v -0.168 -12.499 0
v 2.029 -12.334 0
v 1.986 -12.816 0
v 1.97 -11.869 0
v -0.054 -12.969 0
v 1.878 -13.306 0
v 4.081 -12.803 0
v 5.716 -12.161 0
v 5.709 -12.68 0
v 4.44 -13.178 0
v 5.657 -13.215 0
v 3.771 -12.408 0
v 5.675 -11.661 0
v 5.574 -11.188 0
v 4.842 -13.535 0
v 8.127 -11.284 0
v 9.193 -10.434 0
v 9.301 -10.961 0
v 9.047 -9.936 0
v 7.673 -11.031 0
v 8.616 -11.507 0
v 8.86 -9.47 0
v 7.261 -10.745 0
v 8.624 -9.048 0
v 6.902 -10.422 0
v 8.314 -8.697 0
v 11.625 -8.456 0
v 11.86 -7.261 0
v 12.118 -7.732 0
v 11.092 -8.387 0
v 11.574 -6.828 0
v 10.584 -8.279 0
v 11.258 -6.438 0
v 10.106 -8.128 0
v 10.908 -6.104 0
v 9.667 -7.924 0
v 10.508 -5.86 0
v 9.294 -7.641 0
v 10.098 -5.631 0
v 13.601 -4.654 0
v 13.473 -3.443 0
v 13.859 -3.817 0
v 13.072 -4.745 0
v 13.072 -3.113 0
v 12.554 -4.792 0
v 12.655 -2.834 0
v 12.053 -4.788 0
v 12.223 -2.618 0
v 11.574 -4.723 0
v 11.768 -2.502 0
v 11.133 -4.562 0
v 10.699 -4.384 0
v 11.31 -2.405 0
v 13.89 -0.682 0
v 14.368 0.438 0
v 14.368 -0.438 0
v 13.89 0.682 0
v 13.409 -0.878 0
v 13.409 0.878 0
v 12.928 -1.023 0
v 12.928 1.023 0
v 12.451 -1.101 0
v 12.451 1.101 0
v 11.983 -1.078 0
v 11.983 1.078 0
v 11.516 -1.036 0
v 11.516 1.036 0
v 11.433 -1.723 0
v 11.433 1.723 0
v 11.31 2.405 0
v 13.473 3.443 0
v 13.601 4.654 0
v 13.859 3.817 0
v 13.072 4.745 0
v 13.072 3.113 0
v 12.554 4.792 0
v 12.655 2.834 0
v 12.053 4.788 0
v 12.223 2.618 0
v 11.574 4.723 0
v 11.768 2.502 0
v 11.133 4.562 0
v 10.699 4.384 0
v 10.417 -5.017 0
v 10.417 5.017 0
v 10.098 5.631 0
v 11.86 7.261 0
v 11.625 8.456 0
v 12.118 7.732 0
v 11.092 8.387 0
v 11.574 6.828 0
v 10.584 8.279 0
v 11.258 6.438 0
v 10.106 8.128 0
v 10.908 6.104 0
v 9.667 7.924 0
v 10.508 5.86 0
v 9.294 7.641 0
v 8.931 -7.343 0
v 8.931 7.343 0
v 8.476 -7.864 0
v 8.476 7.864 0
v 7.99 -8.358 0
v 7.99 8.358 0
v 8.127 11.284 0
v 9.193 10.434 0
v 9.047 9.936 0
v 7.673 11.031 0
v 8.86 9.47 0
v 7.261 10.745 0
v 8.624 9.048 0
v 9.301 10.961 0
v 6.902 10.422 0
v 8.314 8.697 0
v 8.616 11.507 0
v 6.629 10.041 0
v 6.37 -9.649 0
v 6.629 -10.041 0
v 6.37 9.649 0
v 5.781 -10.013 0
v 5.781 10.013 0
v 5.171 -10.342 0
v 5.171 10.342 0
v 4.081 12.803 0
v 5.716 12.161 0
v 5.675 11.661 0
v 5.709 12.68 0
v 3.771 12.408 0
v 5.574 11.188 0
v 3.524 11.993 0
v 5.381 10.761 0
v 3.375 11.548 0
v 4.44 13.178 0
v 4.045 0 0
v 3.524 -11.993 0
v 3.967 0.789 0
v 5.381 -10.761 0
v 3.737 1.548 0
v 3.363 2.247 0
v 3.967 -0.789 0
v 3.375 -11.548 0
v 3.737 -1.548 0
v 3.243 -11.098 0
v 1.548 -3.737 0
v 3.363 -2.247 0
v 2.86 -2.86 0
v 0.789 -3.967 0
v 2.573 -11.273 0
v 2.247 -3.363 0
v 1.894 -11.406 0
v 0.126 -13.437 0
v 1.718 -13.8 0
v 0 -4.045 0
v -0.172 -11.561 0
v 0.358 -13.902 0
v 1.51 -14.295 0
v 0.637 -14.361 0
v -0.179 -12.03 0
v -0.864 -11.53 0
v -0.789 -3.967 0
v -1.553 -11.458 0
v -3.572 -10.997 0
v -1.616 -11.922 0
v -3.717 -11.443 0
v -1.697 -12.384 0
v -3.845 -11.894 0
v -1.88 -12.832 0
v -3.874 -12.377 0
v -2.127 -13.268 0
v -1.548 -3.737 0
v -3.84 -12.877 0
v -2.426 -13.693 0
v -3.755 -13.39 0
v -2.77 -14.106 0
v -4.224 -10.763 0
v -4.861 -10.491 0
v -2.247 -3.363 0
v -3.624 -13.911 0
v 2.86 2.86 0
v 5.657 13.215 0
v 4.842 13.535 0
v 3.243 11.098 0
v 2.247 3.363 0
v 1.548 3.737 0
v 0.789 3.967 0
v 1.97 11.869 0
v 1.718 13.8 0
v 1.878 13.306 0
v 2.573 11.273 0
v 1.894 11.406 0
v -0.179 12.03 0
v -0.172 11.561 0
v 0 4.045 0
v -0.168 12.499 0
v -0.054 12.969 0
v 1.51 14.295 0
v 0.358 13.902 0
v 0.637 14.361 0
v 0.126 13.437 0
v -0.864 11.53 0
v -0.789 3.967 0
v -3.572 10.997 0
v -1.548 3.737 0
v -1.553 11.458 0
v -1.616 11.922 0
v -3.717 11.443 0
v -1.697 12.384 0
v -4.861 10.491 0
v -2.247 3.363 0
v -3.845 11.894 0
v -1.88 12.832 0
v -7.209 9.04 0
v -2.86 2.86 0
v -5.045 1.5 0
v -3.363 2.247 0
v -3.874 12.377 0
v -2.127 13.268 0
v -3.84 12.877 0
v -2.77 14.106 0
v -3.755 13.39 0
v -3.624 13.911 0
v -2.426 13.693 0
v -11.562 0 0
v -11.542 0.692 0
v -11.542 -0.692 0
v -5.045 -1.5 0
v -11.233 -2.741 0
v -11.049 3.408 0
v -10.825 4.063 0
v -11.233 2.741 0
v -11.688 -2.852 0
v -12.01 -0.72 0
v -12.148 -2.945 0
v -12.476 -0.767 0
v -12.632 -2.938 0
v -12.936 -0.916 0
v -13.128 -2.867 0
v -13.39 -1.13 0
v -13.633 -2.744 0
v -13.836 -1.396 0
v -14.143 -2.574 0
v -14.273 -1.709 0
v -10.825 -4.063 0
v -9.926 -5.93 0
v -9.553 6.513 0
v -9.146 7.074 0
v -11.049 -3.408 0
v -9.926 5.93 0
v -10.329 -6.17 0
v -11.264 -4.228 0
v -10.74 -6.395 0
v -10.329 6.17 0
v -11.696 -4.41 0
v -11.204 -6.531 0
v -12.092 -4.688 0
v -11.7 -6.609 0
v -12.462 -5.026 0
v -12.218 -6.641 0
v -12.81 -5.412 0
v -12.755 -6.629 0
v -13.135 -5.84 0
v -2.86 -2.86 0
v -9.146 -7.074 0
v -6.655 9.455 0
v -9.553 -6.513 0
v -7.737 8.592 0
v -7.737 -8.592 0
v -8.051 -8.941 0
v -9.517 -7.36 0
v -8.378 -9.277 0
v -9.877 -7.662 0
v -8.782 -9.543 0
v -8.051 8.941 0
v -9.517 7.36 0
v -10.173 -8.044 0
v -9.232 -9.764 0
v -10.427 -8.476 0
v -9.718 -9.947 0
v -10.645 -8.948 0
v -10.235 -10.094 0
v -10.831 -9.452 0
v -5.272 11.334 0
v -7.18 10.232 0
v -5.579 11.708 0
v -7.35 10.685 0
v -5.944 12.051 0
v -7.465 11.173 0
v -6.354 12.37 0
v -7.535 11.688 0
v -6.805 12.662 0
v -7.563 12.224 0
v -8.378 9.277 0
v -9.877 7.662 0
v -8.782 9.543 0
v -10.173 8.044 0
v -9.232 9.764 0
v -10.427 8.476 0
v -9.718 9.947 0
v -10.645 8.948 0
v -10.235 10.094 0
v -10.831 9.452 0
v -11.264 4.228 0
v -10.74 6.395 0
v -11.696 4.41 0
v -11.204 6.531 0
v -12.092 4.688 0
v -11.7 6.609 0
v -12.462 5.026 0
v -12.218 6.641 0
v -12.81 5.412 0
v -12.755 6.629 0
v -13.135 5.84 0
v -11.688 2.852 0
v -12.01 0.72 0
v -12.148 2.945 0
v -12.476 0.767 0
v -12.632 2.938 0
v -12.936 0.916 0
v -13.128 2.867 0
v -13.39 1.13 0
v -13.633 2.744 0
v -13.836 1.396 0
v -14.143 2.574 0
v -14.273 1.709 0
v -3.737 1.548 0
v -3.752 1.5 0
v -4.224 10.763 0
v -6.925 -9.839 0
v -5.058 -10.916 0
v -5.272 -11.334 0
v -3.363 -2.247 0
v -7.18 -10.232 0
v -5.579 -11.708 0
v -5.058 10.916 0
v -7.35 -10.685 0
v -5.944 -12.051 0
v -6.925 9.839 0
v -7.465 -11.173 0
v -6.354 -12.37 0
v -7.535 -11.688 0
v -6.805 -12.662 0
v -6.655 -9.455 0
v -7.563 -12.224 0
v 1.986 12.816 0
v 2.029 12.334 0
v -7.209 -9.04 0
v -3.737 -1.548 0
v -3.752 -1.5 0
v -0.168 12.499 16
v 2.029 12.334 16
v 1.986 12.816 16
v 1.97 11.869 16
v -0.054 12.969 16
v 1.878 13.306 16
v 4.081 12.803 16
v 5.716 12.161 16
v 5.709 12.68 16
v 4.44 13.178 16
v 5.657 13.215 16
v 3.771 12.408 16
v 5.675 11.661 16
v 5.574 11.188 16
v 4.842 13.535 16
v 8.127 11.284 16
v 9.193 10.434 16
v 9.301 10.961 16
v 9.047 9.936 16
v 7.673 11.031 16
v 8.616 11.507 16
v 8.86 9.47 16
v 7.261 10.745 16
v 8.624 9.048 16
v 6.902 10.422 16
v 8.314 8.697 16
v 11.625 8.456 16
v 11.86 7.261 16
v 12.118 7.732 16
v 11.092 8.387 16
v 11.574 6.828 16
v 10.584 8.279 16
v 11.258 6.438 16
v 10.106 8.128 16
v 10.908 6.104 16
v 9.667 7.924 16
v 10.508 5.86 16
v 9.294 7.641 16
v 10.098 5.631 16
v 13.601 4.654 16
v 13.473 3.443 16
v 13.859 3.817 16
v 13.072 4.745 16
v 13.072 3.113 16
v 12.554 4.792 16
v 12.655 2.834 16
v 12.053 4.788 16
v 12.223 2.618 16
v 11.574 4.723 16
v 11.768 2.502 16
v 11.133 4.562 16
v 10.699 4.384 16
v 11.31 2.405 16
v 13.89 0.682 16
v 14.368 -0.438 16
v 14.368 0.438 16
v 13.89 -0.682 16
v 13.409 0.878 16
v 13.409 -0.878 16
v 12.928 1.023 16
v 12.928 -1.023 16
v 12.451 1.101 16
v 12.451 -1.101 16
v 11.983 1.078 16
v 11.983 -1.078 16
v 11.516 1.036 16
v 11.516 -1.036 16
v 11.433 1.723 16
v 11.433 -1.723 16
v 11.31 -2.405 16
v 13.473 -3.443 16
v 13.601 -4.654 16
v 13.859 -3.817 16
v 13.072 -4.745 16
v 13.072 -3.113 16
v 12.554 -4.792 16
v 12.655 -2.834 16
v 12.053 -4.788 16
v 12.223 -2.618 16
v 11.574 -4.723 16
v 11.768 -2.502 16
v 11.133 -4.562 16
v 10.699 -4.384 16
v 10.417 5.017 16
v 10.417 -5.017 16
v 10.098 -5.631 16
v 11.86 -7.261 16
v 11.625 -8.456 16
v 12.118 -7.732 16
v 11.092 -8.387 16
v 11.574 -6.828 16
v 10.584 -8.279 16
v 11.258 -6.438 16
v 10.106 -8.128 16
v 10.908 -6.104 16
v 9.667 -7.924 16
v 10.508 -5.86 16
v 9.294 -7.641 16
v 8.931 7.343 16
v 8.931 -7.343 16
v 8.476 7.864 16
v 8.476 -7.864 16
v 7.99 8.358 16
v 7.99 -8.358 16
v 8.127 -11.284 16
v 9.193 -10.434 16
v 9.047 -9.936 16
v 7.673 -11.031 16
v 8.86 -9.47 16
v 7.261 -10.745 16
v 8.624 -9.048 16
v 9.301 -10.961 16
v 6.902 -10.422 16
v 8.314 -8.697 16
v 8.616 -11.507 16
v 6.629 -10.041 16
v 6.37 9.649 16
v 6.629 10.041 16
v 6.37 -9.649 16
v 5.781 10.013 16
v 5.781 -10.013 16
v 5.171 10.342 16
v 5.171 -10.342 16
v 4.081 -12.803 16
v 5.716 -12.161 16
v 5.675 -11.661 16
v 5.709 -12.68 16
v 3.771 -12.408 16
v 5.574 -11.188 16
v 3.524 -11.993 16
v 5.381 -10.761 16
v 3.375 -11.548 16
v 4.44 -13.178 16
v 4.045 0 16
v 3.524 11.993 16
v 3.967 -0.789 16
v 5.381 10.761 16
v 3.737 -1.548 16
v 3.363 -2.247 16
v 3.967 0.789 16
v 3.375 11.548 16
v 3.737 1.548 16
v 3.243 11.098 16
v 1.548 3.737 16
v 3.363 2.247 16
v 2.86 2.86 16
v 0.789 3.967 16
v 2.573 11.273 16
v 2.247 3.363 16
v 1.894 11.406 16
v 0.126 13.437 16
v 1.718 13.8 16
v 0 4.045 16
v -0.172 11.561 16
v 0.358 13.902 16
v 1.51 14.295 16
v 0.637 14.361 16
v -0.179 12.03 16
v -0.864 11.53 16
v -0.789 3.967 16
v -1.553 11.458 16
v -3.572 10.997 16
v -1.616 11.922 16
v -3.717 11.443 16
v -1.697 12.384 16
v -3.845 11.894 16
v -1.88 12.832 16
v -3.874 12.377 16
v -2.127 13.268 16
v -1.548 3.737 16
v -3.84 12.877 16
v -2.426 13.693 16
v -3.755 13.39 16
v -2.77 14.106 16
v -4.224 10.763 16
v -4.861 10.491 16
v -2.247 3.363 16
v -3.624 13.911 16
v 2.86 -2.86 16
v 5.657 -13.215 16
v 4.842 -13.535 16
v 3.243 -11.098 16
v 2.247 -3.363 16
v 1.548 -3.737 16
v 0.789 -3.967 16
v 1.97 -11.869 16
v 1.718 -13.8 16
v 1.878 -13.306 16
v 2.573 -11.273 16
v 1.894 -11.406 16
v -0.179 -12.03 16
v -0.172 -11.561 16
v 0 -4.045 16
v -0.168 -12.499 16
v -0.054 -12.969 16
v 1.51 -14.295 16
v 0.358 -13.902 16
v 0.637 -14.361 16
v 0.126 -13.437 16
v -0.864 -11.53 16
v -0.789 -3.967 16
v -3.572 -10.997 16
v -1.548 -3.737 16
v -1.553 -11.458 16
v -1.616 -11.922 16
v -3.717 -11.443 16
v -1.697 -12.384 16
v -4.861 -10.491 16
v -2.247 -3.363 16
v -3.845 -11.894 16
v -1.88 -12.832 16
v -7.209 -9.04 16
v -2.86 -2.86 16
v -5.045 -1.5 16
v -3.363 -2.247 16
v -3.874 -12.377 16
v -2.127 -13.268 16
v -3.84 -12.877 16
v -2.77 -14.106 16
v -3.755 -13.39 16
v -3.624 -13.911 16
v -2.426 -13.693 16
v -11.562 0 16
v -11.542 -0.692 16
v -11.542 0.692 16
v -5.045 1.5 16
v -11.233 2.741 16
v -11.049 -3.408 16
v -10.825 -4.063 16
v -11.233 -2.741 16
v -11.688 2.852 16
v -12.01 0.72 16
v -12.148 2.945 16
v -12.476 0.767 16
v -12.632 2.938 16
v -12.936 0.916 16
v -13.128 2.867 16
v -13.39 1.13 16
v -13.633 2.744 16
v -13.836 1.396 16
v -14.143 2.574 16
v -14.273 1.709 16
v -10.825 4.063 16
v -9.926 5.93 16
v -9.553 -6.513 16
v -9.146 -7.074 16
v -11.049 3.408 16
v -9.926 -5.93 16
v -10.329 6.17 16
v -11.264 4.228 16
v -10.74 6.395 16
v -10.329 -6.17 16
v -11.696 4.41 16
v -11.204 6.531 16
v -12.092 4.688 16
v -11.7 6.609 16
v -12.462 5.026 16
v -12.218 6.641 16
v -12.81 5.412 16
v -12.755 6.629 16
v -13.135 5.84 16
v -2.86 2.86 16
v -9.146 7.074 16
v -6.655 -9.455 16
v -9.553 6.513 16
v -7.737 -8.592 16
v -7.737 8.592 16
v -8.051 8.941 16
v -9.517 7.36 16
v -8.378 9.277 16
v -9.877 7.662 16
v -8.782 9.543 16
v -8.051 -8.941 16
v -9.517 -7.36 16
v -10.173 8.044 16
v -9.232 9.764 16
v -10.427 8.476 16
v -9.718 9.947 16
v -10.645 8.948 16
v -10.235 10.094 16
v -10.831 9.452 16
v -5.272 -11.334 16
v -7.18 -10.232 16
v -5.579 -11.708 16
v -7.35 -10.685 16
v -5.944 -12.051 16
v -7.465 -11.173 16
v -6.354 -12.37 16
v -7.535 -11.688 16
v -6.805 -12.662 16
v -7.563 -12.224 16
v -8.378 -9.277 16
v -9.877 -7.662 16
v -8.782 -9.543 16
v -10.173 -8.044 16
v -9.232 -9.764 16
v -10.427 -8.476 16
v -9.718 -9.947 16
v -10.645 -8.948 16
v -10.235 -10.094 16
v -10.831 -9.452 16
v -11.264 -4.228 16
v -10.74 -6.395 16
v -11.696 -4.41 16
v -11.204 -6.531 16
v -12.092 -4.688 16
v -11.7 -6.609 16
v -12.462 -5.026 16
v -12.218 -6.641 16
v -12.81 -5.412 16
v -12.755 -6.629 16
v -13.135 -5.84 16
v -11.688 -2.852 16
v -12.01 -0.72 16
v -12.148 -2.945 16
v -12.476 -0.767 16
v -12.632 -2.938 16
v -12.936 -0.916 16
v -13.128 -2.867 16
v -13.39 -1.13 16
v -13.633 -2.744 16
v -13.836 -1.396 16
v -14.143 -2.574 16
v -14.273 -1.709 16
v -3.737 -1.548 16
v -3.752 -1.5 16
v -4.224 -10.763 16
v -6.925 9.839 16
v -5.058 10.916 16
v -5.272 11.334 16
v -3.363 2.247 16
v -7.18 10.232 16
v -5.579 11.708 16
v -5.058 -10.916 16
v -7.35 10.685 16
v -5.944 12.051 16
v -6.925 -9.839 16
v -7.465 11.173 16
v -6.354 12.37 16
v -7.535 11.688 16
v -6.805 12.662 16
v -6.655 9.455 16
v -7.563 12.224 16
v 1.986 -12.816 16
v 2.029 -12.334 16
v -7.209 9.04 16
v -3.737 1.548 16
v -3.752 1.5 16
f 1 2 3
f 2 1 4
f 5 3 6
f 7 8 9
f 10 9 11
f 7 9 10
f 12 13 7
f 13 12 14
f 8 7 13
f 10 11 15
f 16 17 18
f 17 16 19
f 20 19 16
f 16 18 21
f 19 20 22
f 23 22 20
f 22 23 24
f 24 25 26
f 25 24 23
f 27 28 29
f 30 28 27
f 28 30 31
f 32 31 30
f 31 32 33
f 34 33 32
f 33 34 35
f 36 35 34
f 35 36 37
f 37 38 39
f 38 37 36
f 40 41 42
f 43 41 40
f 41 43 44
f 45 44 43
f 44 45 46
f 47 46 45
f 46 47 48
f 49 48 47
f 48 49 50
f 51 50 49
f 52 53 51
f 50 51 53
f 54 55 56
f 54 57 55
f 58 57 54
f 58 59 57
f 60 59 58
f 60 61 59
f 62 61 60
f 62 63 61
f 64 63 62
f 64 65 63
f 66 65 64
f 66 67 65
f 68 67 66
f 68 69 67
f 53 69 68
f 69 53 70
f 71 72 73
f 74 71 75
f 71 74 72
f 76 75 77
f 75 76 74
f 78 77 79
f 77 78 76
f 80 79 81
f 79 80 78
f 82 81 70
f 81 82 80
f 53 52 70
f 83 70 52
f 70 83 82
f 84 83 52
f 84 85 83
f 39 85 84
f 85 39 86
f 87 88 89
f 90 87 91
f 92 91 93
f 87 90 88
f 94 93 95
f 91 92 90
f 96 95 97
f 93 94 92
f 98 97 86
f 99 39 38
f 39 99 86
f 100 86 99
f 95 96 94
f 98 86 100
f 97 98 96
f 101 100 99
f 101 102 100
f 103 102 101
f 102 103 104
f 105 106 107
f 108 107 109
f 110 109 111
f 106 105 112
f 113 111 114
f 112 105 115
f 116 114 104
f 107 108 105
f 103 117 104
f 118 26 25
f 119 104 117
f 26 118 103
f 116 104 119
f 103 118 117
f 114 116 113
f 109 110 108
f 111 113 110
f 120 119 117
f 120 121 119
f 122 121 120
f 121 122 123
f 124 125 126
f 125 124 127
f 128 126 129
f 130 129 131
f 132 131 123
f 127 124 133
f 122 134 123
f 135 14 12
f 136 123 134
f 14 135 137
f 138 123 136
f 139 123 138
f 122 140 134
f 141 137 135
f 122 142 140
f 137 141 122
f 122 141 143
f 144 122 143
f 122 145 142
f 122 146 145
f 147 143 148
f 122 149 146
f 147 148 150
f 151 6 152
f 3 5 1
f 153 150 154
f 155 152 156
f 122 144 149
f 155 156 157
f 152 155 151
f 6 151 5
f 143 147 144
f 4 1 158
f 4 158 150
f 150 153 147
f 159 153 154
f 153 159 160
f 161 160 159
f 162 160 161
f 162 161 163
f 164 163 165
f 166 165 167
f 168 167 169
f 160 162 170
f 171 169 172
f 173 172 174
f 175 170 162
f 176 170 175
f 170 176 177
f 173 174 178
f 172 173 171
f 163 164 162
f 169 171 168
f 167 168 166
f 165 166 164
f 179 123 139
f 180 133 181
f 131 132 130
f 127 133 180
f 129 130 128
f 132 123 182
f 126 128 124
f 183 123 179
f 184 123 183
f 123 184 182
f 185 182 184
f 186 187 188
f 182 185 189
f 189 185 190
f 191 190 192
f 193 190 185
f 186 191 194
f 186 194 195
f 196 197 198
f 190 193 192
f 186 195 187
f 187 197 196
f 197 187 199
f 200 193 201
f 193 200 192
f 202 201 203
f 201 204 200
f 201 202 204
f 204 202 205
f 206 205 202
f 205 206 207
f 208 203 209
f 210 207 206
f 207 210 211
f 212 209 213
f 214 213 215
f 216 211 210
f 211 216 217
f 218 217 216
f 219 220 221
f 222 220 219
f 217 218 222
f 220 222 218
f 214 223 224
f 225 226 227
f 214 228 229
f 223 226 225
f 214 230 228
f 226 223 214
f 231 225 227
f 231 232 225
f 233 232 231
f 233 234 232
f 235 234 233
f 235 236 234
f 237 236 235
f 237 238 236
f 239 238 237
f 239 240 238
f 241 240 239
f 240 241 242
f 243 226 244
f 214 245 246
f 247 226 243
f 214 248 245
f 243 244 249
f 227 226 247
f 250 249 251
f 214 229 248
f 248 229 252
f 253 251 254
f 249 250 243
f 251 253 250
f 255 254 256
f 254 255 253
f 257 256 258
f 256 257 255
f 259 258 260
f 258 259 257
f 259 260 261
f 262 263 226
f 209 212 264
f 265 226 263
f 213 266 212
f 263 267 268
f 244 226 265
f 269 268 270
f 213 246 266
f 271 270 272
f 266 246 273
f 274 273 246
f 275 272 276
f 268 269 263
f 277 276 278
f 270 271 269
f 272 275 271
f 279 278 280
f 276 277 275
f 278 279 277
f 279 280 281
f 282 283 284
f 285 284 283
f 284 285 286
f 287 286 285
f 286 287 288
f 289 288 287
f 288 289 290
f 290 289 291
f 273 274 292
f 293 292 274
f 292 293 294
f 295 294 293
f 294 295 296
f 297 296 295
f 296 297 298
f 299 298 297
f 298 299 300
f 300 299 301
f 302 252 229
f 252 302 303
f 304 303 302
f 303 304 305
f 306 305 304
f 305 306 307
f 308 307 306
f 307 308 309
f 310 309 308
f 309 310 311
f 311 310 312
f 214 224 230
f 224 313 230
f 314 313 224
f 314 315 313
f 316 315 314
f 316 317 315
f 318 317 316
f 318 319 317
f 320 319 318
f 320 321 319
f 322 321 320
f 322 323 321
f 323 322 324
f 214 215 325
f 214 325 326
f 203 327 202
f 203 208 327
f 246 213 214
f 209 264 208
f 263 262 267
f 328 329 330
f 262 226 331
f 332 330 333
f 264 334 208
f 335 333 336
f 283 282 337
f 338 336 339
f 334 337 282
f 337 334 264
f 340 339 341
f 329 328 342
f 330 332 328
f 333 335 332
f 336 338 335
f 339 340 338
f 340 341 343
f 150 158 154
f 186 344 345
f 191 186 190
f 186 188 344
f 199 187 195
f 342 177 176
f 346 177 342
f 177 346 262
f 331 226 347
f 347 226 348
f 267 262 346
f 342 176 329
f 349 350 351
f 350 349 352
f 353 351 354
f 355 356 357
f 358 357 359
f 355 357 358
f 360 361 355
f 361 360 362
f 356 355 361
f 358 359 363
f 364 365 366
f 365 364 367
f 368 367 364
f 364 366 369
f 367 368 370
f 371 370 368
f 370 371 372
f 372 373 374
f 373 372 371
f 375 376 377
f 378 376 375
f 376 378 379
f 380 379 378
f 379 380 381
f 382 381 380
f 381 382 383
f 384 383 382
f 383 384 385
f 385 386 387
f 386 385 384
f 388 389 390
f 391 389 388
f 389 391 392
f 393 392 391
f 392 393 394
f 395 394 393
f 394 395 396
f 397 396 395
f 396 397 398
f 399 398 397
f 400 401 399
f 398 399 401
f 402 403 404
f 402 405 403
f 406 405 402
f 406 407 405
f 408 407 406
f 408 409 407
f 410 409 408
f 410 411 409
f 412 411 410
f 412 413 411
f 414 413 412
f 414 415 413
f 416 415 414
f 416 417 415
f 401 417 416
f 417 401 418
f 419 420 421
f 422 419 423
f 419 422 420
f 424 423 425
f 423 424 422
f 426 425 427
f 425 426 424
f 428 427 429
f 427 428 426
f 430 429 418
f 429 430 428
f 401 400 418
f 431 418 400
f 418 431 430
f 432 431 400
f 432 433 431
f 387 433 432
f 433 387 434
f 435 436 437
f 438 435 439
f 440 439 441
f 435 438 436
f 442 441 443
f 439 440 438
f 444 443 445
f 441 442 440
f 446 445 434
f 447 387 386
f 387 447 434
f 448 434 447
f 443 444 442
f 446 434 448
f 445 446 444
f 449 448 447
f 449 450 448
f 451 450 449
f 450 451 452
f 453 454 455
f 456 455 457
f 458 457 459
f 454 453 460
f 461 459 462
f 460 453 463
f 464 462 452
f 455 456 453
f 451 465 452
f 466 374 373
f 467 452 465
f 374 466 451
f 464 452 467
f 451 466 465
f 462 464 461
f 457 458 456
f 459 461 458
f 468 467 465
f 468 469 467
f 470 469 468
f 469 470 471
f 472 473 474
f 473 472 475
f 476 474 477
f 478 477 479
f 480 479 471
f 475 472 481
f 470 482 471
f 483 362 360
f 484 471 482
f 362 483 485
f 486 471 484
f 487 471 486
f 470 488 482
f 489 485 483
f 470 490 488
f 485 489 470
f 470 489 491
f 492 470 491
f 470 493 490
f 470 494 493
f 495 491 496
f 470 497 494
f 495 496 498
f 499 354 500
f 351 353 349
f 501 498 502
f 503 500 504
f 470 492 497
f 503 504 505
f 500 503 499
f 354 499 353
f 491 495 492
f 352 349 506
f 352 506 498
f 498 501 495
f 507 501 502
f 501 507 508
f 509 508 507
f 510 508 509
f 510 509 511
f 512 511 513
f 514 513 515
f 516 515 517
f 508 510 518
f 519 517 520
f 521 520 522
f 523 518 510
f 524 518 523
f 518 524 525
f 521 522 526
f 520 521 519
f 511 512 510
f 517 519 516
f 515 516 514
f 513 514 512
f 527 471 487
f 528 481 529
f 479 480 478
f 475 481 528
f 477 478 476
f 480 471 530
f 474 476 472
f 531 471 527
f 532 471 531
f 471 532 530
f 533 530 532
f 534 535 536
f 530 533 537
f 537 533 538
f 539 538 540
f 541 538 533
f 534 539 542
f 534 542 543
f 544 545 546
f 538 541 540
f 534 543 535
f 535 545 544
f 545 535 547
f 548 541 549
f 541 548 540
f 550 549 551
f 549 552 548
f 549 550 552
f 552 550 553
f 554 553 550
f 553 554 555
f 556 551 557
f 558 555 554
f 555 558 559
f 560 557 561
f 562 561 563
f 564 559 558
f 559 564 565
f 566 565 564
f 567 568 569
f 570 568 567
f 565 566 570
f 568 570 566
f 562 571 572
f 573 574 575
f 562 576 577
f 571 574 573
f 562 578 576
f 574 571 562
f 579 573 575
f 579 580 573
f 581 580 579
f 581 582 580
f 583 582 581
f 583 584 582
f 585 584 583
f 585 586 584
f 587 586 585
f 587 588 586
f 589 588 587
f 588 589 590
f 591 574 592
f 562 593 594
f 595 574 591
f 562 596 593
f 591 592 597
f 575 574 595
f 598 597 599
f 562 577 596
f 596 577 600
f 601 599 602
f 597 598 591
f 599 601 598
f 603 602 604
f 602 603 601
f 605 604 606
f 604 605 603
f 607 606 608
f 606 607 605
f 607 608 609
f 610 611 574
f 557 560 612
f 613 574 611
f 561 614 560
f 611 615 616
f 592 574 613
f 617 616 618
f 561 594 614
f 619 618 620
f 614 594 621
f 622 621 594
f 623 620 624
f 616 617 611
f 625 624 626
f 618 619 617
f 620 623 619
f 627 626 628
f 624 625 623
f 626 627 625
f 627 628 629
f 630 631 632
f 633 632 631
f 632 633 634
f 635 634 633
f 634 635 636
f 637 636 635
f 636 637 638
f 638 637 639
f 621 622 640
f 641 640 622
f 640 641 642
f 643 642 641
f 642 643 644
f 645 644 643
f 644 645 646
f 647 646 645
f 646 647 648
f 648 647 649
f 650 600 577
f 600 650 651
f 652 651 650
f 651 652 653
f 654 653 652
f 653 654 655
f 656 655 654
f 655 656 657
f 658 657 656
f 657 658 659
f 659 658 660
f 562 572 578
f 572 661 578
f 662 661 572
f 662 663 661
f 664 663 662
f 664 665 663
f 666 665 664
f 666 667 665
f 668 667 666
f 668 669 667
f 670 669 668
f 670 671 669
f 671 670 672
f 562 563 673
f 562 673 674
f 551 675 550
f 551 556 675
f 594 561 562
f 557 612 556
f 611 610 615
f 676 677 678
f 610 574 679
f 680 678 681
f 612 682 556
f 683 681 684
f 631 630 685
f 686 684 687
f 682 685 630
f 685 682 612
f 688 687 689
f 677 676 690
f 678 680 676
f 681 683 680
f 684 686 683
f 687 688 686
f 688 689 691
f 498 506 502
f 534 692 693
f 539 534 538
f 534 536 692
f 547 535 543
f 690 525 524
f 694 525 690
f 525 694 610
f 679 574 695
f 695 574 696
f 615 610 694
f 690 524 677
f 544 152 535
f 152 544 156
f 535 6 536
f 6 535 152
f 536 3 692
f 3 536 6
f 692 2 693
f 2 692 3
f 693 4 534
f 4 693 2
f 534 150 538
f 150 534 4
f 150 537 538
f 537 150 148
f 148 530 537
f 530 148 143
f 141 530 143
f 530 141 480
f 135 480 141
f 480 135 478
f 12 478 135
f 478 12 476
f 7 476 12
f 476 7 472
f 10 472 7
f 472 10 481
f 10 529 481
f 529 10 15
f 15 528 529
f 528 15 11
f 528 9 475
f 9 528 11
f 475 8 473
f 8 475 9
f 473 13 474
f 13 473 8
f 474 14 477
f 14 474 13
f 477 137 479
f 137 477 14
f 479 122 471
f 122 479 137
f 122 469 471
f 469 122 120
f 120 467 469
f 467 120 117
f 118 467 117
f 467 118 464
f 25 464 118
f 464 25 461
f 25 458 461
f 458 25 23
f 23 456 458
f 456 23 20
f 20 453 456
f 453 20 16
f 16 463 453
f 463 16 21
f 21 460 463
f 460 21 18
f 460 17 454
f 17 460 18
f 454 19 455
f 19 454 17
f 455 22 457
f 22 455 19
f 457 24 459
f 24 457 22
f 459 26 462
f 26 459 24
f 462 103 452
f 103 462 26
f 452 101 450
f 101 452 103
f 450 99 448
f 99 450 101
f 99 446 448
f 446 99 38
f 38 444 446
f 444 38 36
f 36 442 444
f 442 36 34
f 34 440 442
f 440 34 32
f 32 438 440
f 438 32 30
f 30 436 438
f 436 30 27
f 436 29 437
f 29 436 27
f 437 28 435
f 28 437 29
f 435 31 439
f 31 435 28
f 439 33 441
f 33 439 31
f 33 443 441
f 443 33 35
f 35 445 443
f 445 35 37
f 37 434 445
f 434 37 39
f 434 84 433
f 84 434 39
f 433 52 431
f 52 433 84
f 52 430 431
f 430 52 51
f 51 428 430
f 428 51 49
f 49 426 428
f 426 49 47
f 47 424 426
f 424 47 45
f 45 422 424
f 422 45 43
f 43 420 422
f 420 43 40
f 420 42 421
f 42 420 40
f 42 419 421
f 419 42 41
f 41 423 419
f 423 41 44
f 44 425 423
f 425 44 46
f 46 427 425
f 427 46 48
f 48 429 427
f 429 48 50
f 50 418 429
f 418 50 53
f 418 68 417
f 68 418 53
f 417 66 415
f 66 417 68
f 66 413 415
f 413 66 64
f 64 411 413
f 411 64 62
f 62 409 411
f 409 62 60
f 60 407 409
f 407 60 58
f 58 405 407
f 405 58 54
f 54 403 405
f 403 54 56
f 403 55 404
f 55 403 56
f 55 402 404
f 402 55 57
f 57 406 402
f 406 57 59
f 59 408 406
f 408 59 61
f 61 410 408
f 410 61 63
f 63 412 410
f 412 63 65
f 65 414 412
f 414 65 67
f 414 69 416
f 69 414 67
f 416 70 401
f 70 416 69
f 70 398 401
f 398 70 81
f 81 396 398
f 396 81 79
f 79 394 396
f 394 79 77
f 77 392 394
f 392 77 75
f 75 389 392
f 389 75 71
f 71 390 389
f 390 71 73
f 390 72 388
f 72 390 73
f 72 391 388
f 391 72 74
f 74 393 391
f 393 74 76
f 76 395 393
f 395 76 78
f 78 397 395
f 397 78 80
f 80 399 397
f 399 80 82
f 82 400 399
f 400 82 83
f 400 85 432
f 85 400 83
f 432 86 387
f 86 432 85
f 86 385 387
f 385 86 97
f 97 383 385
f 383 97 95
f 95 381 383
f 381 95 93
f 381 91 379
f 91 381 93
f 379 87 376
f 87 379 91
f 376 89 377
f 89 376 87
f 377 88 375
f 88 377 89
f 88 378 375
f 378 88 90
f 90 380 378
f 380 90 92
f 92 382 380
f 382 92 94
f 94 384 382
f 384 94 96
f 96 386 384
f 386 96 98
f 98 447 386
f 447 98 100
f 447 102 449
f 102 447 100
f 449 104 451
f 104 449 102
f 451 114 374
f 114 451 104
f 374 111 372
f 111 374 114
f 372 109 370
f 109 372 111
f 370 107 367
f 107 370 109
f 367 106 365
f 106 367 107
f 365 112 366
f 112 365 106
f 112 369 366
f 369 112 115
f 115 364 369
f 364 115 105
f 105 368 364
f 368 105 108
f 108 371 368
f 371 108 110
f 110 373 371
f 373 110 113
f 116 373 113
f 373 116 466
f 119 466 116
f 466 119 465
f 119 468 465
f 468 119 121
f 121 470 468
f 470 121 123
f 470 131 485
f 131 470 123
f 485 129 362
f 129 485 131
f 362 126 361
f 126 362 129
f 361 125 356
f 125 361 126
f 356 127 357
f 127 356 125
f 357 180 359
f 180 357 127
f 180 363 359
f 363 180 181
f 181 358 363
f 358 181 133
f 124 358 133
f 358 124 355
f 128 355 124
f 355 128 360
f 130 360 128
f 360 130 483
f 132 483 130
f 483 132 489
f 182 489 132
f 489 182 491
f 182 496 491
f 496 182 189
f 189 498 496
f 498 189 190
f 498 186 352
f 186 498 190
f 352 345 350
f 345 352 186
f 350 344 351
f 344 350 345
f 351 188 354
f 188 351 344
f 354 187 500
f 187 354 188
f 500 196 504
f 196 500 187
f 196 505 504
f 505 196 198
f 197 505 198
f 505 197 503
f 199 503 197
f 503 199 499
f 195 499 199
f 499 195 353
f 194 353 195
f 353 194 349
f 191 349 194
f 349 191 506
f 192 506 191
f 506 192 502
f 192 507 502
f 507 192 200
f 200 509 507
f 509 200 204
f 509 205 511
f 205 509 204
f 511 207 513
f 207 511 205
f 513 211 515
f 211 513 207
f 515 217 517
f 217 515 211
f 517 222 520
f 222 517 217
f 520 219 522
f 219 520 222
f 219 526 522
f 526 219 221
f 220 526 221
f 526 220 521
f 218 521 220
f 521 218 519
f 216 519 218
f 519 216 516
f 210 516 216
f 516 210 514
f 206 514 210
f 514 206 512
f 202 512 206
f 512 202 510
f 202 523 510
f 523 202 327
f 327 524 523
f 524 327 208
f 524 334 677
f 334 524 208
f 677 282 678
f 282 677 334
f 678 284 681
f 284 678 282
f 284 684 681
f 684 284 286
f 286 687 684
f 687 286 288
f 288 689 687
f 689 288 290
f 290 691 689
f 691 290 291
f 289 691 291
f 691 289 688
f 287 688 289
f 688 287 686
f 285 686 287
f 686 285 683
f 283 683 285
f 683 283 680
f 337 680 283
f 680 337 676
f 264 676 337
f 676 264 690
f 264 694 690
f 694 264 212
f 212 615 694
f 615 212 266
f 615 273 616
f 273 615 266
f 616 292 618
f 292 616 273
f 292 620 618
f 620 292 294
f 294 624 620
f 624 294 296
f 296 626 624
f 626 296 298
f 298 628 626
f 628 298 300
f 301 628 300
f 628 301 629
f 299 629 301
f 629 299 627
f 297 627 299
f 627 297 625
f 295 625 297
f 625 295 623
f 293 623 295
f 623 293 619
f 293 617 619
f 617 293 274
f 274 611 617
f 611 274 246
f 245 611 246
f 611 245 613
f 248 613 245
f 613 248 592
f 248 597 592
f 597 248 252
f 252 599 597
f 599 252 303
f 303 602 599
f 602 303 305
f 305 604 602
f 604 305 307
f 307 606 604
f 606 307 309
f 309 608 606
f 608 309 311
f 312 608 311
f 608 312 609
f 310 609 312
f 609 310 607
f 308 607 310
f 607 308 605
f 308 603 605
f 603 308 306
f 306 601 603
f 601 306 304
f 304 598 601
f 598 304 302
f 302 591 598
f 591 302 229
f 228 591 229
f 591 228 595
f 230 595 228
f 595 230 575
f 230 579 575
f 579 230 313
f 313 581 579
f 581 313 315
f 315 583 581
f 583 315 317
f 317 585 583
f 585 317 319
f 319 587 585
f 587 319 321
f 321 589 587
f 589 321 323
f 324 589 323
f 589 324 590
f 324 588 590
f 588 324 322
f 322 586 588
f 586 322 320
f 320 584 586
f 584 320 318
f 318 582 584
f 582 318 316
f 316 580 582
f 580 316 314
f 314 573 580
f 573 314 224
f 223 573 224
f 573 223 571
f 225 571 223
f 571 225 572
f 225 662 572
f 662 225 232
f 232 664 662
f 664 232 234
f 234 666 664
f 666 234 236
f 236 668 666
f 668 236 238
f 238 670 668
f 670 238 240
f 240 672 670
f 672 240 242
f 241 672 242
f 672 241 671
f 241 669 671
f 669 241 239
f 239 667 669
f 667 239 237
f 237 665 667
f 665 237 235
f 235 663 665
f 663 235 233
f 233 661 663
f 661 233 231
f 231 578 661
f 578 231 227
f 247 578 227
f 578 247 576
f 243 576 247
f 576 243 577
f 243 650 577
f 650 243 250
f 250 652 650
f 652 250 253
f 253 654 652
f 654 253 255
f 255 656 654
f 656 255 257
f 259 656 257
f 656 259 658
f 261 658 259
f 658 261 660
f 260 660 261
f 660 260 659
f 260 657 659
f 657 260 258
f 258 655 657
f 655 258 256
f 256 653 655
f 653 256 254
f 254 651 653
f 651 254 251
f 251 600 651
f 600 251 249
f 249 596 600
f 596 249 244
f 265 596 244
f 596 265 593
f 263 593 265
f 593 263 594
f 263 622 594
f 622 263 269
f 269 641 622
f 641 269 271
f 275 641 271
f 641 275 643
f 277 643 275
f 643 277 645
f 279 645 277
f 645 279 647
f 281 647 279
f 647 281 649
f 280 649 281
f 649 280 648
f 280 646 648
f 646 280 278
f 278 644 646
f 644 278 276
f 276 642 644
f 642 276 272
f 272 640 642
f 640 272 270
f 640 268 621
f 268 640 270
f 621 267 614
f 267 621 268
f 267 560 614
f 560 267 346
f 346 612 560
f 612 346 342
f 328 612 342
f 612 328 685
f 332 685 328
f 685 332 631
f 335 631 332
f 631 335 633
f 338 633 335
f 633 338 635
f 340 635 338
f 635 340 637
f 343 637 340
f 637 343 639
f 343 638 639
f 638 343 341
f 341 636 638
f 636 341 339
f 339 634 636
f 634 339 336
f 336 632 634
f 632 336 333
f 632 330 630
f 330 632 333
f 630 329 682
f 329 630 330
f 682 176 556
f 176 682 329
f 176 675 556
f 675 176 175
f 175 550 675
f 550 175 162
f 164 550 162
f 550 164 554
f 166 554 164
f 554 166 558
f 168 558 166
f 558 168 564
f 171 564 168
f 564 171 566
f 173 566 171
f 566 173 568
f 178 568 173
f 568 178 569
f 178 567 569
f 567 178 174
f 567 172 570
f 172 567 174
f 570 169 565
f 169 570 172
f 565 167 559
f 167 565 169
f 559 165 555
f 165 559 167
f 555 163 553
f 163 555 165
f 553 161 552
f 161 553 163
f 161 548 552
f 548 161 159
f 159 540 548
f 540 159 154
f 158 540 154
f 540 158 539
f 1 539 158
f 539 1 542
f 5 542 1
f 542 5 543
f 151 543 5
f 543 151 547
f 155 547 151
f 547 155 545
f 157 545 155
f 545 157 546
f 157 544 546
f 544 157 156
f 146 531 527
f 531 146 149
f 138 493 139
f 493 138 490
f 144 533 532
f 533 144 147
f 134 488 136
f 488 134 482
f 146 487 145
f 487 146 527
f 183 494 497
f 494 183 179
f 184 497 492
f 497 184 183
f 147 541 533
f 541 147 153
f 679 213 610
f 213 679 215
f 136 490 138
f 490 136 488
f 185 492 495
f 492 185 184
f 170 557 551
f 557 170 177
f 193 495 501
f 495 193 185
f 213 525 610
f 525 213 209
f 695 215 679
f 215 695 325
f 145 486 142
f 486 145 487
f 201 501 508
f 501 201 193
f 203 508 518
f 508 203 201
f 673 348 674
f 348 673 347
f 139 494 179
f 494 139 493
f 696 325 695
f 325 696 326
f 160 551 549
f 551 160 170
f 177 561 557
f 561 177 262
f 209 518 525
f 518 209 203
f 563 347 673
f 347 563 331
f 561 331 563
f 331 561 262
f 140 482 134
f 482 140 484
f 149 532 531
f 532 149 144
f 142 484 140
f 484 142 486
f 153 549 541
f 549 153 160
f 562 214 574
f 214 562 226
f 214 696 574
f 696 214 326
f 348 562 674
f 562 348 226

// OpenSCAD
$fn = 32;

// ----------------------------------------------------------------------
// Spur gear: m=1.25 z=21, 28.75 mm tip diameter x 16 mm
// ----------------------------------------------------------------------

// --- parameters (mm) ---
module_m = 1.25;          // module
teeth = 21;               // number of teeth
face_w = 16;              // face width
pa = 20;                  // pressure angle, deg
bore_d = 8.09;            // shaft bore
key_w = 3;                // keyway width
key_h = 1.4;              // keyway depth

/* --- involute profile --- */
pitch_r = module_m * teeth / 2;
base_r = pitch_r * cos(pa);
tip_r = pitch_r + module_m;
root_r = pitch_r - 1.25 * module_m;
flank_steps = 6;

function inv_deg(a) = (tan(a) - a * PI / 180) * 180 / PI;
function flank_r(i) = root_r + (tip_r - root_r) * i / flank_steps;
function half_angle(r) = 90 / teeth + inv_deg(pa) - inv_deg(acos(min(1, base_r / r)));
function tooth_pt(k, i, side) =
    let (r = flank_r(i), a = k * 360 / teeth + side * half_angle(r))
    [r * cos(a), r * sin(a)];

module tooth_profile() {
  polygon(points = [
    for (k = [0 : teeth - 1])
      each [
        for (i = [0 : flank_steps]) tooth_pt(k, i, -1),
        for (i = [flank_steps : -1 : 0]) tooth_pt(k, i, 1),
        let (ta = (k + 0.5) * 360 / teeth)
          [root_r * cos(ta), root_r * sin(ta)]
      ]
  ]);
}

module gear_disc() {
  linear_extrude(height = face_w) tooth_profile();
}

difference() {
  gear_disc();
  translate([0, 0, -1]) cylinder(h = face_w + 3, d = bore_d);
  /* keyway on the bore */
  translate([-bore_d / 2 - 1, -key_w / 2, -1]) cube([key_h + 1, key_w, face_w + 3]);
}
